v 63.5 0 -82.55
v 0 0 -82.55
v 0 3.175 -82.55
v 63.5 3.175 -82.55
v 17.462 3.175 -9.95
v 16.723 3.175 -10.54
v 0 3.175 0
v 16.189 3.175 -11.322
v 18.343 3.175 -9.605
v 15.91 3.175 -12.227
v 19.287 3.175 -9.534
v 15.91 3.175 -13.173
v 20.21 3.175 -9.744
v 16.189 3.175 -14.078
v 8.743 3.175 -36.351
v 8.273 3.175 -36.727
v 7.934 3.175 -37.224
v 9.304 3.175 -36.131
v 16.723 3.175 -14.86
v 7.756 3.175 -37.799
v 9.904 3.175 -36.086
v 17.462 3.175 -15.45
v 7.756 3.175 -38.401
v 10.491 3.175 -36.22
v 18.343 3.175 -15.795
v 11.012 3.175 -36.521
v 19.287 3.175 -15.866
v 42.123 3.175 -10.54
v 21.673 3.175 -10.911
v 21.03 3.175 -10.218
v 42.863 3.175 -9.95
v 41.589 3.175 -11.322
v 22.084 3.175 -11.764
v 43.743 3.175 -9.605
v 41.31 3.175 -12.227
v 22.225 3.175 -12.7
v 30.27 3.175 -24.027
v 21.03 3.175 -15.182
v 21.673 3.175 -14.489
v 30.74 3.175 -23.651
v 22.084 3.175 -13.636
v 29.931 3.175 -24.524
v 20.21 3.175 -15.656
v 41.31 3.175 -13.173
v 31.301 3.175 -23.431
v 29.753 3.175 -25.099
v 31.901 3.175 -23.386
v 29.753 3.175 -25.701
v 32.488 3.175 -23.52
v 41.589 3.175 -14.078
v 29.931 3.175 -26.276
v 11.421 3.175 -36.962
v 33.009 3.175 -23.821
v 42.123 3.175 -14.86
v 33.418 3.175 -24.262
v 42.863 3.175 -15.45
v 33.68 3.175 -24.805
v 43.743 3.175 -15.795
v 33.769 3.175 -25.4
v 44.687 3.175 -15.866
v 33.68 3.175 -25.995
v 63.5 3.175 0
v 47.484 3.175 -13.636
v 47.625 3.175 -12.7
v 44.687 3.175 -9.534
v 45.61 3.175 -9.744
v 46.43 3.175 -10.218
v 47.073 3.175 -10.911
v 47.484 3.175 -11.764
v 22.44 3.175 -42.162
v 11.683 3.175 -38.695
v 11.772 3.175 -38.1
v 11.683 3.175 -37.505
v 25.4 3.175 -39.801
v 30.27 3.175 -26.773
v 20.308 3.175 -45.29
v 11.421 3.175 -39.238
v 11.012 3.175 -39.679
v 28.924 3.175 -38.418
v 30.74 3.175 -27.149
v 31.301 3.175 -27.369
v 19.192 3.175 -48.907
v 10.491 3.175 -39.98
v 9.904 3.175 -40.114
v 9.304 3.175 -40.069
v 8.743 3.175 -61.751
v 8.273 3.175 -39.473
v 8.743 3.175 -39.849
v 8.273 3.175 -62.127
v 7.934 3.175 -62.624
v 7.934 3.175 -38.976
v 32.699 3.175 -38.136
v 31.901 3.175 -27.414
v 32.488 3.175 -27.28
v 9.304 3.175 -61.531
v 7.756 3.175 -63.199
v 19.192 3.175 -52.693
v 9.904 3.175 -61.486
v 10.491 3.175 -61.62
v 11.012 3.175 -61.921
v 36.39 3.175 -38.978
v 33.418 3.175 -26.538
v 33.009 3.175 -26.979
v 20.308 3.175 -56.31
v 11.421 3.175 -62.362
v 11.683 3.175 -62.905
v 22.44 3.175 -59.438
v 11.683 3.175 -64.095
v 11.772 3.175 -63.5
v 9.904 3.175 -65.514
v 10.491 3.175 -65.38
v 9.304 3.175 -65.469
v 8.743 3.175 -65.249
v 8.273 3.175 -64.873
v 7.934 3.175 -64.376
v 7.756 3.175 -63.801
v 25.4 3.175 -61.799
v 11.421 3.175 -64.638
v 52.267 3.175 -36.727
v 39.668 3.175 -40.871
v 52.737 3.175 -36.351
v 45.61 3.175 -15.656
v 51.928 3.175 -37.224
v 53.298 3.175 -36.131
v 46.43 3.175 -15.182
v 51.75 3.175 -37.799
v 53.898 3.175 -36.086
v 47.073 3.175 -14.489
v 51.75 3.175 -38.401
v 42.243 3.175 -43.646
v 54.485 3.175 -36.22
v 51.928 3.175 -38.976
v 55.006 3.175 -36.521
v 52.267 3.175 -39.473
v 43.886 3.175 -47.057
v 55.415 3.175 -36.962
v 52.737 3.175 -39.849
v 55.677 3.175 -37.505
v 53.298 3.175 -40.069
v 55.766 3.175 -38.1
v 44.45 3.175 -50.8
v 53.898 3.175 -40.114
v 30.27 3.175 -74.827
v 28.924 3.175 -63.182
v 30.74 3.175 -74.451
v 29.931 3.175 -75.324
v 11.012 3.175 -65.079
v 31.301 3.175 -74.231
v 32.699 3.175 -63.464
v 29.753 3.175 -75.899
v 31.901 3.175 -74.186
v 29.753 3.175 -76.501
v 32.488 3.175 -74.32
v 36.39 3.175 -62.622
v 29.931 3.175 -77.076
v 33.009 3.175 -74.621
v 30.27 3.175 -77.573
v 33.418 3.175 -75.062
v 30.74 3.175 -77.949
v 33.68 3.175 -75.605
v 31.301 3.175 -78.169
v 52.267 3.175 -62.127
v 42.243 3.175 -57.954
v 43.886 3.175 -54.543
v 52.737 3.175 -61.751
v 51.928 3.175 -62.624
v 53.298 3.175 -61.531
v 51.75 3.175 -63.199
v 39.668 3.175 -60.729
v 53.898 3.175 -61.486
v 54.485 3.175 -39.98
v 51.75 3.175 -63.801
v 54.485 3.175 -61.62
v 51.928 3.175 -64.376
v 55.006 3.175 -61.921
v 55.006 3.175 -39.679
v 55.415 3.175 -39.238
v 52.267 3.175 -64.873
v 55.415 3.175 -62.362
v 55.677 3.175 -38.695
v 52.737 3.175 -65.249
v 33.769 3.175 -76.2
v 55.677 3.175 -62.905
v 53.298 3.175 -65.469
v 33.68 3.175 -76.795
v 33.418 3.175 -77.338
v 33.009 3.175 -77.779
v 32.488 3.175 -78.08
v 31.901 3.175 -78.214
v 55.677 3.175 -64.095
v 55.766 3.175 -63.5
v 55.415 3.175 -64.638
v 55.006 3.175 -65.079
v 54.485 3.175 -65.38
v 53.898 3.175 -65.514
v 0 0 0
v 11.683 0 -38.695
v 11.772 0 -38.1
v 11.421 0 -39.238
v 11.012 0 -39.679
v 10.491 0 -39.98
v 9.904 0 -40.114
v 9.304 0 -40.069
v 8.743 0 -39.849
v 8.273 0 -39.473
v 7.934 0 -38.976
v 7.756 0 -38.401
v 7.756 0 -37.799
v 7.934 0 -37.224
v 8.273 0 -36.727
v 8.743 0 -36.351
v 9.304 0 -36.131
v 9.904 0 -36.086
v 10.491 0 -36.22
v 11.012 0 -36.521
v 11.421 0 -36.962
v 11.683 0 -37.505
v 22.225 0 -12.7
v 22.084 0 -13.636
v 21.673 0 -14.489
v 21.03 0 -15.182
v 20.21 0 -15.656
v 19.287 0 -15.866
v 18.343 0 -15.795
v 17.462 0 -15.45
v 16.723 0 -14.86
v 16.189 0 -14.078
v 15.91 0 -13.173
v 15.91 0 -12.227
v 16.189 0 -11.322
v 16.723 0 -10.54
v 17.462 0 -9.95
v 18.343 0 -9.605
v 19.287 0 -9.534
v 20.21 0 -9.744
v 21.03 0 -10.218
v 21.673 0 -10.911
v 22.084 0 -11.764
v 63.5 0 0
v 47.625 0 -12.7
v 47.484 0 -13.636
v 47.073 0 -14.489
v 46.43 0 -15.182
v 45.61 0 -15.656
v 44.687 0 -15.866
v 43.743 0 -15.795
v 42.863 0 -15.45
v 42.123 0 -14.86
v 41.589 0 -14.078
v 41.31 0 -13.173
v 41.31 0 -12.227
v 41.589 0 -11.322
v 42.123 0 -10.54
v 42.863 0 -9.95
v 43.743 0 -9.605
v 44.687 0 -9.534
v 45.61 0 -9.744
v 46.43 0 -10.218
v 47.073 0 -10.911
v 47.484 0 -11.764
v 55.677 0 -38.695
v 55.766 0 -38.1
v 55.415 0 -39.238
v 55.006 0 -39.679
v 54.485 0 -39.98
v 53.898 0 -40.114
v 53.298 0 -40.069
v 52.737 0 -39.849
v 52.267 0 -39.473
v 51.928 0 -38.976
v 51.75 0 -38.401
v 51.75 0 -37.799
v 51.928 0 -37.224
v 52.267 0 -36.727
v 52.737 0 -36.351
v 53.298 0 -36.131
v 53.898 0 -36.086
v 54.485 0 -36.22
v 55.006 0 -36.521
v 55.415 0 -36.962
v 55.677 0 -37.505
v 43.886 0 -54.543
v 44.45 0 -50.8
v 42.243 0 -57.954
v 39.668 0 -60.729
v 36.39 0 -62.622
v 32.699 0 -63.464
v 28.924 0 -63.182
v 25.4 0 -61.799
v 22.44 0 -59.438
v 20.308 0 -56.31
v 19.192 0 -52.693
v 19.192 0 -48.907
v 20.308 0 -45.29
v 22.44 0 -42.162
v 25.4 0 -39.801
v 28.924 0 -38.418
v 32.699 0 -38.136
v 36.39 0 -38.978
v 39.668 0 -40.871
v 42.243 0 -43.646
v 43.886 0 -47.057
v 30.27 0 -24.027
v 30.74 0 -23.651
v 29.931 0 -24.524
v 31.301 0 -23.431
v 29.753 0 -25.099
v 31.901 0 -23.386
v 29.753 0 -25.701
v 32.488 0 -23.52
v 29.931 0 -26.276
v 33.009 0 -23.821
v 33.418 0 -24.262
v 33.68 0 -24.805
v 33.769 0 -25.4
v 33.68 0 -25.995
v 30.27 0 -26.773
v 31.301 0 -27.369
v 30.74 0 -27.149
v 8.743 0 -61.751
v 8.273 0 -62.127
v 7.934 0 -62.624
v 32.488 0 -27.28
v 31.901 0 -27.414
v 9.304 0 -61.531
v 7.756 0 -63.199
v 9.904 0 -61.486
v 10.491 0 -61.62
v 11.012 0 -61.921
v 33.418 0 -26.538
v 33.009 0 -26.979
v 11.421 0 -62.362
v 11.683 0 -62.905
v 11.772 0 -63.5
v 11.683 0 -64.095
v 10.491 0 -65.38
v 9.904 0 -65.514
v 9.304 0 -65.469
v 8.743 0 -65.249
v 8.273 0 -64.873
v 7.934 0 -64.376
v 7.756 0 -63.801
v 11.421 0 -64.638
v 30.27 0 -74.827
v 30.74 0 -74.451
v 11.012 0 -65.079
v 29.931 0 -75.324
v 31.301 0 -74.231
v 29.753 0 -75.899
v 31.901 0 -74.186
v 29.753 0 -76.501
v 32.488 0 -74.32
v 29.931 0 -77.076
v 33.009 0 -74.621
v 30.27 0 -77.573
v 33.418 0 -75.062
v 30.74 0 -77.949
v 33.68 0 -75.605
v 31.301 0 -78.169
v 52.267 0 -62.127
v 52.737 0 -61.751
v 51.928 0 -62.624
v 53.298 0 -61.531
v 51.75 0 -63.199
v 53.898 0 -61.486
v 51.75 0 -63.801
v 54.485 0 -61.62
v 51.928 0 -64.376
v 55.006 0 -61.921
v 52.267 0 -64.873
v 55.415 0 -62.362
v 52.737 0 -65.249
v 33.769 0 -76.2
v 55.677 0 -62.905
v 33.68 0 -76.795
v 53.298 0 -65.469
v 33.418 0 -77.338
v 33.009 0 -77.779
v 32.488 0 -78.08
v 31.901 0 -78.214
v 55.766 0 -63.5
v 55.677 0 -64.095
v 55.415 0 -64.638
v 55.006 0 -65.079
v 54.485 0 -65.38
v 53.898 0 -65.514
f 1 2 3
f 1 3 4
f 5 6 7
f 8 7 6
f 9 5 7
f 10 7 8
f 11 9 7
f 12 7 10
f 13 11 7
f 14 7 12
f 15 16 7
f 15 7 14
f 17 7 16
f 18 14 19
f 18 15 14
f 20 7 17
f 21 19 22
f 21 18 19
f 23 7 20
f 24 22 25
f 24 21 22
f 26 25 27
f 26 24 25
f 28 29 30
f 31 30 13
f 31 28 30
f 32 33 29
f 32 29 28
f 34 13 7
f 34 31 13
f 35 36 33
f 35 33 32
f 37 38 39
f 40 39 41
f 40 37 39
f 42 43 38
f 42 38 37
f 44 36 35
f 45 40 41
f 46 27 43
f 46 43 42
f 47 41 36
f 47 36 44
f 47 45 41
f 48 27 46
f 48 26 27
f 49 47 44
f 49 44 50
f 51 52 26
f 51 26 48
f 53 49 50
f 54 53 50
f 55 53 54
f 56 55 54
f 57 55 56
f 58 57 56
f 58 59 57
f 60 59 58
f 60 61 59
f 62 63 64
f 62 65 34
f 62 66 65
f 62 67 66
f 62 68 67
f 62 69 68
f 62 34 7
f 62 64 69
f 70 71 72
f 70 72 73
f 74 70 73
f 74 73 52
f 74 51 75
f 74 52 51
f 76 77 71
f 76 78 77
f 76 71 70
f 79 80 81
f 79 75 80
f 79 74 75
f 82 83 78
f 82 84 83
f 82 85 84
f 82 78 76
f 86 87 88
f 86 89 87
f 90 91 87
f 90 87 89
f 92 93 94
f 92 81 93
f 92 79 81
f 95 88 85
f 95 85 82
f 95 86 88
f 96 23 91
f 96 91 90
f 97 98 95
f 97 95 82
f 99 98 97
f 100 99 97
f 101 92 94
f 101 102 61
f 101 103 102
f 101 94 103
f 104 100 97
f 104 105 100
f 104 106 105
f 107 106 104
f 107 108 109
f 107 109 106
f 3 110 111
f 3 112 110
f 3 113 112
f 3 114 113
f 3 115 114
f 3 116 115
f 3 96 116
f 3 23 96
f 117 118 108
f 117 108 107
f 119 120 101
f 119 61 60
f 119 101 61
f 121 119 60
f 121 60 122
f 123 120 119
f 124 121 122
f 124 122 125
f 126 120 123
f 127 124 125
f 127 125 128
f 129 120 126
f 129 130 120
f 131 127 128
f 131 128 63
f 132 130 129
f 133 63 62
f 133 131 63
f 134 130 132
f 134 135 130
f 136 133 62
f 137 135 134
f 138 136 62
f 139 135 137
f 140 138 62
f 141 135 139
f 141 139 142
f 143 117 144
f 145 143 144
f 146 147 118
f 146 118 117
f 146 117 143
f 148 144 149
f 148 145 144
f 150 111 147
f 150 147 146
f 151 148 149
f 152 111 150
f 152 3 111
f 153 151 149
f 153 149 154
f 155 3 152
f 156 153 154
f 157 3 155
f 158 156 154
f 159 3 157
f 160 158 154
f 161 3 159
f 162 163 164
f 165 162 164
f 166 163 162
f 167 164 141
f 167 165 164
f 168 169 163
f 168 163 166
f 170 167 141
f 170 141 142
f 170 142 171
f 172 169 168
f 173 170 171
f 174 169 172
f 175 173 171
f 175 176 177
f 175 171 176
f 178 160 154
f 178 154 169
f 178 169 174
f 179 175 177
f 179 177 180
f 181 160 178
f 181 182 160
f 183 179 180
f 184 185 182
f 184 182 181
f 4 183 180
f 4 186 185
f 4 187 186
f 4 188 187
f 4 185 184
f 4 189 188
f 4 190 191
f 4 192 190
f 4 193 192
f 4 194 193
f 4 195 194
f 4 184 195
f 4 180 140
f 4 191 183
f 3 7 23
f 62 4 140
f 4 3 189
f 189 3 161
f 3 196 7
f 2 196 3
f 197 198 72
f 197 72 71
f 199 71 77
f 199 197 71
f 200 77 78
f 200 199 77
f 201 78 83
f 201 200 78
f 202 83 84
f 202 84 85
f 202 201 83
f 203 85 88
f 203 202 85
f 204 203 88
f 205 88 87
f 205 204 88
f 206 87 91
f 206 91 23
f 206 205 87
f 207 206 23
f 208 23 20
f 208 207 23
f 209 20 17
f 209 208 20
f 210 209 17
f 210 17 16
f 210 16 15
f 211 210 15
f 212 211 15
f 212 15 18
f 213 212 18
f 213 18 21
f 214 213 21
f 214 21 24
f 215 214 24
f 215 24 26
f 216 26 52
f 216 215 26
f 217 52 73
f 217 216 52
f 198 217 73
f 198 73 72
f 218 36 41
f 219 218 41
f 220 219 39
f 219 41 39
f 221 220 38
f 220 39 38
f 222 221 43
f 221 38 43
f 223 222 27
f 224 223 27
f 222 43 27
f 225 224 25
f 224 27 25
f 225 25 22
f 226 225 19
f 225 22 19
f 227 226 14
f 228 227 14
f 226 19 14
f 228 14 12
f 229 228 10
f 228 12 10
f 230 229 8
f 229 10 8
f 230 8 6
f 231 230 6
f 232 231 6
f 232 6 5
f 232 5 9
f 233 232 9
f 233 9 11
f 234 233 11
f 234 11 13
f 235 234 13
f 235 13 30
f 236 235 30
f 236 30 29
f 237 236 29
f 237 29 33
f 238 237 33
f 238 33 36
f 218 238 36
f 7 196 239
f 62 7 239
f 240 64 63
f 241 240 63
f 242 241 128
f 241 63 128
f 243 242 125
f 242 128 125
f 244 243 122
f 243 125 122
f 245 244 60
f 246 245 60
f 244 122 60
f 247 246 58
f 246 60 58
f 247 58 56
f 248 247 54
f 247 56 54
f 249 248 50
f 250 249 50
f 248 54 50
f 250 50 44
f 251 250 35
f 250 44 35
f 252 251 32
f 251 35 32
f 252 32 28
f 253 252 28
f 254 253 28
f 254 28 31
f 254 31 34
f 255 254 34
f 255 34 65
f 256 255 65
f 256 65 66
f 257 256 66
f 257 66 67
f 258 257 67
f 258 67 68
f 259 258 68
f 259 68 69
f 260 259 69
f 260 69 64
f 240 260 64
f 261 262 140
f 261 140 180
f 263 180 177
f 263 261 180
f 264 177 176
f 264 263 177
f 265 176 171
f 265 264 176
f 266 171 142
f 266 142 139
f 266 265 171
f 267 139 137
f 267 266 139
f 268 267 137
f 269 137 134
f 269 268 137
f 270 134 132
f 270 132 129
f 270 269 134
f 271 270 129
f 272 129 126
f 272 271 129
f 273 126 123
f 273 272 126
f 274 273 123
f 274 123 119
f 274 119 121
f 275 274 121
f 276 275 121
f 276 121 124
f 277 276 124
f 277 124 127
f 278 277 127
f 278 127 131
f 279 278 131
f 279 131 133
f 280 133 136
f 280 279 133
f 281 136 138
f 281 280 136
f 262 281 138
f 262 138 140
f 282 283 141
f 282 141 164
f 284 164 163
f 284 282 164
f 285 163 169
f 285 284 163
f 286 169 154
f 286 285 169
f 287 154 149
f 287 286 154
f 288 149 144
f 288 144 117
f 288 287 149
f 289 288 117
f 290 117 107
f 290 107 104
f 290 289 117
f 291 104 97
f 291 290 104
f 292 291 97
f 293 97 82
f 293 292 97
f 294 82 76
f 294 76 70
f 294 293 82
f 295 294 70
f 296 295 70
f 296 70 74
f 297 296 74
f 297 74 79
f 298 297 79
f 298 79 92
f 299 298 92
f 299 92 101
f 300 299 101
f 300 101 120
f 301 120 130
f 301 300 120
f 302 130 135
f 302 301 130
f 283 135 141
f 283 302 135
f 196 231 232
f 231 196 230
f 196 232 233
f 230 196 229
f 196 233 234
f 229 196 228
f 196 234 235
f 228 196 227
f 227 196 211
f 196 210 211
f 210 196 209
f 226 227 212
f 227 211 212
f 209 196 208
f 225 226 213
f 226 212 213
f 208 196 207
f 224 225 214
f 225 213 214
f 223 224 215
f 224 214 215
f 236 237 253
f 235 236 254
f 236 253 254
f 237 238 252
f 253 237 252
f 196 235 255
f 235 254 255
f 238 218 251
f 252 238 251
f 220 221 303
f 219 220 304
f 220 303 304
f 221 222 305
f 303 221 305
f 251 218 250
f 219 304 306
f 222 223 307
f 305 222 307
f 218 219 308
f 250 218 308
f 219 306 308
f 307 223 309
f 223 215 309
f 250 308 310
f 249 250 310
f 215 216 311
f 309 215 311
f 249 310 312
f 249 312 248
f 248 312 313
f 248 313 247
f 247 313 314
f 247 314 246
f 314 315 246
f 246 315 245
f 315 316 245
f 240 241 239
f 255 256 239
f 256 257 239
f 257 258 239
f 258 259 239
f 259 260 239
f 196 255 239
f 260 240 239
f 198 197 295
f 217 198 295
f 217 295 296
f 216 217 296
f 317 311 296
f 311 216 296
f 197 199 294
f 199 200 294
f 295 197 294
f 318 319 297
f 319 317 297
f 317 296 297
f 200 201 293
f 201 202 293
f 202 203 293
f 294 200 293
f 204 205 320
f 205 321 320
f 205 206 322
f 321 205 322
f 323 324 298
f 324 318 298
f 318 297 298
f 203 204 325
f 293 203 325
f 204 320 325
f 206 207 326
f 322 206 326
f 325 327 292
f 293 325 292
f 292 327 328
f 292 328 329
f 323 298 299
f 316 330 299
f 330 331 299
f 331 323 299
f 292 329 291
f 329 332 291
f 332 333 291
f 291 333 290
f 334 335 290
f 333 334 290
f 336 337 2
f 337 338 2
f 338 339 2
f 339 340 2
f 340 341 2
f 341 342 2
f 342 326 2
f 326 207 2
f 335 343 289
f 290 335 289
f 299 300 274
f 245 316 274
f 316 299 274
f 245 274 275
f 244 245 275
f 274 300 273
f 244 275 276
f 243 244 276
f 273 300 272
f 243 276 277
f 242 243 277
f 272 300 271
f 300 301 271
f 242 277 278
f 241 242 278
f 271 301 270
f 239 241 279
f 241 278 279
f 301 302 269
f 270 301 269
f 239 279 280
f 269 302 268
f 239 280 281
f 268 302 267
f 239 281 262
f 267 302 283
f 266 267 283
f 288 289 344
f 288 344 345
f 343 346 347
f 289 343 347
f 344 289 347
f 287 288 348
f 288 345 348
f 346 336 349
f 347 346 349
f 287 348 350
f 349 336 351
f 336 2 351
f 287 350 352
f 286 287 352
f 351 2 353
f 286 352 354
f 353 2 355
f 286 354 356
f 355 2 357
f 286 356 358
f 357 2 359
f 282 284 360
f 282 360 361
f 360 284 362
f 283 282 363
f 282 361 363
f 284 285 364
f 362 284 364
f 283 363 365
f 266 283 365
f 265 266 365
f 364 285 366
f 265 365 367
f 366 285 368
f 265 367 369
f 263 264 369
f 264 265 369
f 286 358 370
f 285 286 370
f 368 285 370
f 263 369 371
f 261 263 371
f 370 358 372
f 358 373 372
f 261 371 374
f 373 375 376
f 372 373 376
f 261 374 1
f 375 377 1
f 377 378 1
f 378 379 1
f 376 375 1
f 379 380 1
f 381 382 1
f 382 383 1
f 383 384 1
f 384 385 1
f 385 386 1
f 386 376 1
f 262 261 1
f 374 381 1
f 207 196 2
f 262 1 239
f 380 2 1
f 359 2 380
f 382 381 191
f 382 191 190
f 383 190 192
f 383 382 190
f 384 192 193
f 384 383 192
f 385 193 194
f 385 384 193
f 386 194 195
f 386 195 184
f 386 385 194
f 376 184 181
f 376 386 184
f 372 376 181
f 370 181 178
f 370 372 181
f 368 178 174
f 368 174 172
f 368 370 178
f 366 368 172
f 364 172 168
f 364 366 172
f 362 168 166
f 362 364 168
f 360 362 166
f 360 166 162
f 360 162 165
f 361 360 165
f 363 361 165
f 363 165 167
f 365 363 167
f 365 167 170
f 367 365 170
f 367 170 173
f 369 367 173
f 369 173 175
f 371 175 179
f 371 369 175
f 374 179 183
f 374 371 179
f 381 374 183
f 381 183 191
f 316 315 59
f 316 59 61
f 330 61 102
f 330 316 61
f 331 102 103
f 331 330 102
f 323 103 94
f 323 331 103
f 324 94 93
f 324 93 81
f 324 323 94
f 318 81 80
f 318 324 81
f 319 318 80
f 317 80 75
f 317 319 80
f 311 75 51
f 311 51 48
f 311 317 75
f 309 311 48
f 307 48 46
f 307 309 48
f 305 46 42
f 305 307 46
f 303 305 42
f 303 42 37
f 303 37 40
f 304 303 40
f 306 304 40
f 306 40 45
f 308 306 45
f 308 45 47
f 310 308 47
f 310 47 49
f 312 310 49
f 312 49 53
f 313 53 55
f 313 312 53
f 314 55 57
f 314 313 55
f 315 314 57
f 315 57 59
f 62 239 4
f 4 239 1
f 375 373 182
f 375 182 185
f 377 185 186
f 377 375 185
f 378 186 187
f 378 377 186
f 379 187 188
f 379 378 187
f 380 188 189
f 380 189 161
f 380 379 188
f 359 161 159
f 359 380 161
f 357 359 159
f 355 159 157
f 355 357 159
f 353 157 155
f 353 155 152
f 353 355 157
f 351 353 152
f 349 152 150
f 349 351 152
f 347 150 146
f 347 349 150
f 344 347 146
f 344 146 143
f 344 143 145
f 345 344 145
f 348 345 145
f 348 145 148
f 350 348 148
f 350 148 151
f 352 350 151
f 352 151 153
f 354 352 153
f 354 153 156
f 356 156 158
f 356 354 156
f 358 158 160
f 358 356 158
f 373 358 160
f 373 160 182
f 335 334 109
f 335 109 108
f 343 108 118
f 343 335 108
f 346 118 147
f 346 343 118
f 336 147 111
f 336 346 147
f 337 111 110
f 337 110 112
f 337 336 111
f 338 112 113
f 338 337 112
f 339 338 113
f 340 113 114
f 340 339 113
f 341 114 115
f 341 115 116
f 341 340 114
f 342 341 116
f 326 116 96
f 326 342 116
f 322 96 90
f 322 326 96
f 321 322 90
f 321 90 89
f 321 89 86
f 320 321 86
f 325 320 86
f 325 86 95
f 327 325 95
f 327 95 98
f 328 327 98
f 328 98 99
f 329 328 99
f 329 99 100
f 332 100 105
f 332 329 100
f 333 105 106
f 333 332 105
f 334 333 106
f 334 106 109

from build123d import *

# Parameters (mm, degrees)
SKETCH1_W           = 63.5
SKETCH1_H           = 82.55
SKETCH1_R           = 12.7
SKETCH1_R_2         = 2.0193
BOSS_EXTRUDE1_DEPTH = 3.175
SKETCH2_R           = 3.175
CUT_EXTRUDE1_DEPTH  = 4.175


with BuildPart() as part:
    # Sketch1 → Boss-Extrude1 (new body)
    with BuildSketch(Plane(origin=(0, 0, 0), x_dir=(1, 0, 0), z_dir=(0, 1, 0))):
        with Locations((31.75, 41.275)):
            Rectangle(SKETCH1_W, SKETCH1_H)
        with Locations((31.75, 50.8)):
            Circle(SKETCH1_R, mode=Mode.SUBTRACT)
        with Locations((9.752954744, 63.5)):
            Circle(SKETCH1_R_2, mode=Mode.SUBTRACT)
        with Locations((31.75, 76.2)):
            Circle(SKETCH1_R_2, mode=Mode.SUBTRACT)
        with Locations((53.747045256, 63.5)):
            Circle(SKETCH1_R_2, mode=Mode.SUBTRACT)
        with Locations((53.747045256, 38.1)):
            Circle(SKETCH1_R_2, mode=Mode.SUBTRACT)
        with Locations((31.75, 25.4)):
            Circle(SKETCH1_R_2, mode=Mode.SUBTRACT)
        with Locations((9.752954744, 38.1)):
            Circle(SKETCH1_R_2, mode=Mode.SUBTRACT)
    extrude(amount=BOSS_EXTRUDE1_DEPTH)

    # Sketch2 → Cut-Extrude1 (cut, through all)
    with BuildSketch(Plane(origin=(0, 3.175, 0), x_dir=(1, 0, 0), z_dir=(0, 1, 0))):
        with Locations((19.05, 12.7)):
            Circle(SKETCH2_R)
        with Locations((44.45, 12.7)):
            Circle(SKETCH2_R)
    extrude(amount=-CUT_EXTRUDE1_DEPTH, mode=Mode.SUBTRACT)


solid = part.part
